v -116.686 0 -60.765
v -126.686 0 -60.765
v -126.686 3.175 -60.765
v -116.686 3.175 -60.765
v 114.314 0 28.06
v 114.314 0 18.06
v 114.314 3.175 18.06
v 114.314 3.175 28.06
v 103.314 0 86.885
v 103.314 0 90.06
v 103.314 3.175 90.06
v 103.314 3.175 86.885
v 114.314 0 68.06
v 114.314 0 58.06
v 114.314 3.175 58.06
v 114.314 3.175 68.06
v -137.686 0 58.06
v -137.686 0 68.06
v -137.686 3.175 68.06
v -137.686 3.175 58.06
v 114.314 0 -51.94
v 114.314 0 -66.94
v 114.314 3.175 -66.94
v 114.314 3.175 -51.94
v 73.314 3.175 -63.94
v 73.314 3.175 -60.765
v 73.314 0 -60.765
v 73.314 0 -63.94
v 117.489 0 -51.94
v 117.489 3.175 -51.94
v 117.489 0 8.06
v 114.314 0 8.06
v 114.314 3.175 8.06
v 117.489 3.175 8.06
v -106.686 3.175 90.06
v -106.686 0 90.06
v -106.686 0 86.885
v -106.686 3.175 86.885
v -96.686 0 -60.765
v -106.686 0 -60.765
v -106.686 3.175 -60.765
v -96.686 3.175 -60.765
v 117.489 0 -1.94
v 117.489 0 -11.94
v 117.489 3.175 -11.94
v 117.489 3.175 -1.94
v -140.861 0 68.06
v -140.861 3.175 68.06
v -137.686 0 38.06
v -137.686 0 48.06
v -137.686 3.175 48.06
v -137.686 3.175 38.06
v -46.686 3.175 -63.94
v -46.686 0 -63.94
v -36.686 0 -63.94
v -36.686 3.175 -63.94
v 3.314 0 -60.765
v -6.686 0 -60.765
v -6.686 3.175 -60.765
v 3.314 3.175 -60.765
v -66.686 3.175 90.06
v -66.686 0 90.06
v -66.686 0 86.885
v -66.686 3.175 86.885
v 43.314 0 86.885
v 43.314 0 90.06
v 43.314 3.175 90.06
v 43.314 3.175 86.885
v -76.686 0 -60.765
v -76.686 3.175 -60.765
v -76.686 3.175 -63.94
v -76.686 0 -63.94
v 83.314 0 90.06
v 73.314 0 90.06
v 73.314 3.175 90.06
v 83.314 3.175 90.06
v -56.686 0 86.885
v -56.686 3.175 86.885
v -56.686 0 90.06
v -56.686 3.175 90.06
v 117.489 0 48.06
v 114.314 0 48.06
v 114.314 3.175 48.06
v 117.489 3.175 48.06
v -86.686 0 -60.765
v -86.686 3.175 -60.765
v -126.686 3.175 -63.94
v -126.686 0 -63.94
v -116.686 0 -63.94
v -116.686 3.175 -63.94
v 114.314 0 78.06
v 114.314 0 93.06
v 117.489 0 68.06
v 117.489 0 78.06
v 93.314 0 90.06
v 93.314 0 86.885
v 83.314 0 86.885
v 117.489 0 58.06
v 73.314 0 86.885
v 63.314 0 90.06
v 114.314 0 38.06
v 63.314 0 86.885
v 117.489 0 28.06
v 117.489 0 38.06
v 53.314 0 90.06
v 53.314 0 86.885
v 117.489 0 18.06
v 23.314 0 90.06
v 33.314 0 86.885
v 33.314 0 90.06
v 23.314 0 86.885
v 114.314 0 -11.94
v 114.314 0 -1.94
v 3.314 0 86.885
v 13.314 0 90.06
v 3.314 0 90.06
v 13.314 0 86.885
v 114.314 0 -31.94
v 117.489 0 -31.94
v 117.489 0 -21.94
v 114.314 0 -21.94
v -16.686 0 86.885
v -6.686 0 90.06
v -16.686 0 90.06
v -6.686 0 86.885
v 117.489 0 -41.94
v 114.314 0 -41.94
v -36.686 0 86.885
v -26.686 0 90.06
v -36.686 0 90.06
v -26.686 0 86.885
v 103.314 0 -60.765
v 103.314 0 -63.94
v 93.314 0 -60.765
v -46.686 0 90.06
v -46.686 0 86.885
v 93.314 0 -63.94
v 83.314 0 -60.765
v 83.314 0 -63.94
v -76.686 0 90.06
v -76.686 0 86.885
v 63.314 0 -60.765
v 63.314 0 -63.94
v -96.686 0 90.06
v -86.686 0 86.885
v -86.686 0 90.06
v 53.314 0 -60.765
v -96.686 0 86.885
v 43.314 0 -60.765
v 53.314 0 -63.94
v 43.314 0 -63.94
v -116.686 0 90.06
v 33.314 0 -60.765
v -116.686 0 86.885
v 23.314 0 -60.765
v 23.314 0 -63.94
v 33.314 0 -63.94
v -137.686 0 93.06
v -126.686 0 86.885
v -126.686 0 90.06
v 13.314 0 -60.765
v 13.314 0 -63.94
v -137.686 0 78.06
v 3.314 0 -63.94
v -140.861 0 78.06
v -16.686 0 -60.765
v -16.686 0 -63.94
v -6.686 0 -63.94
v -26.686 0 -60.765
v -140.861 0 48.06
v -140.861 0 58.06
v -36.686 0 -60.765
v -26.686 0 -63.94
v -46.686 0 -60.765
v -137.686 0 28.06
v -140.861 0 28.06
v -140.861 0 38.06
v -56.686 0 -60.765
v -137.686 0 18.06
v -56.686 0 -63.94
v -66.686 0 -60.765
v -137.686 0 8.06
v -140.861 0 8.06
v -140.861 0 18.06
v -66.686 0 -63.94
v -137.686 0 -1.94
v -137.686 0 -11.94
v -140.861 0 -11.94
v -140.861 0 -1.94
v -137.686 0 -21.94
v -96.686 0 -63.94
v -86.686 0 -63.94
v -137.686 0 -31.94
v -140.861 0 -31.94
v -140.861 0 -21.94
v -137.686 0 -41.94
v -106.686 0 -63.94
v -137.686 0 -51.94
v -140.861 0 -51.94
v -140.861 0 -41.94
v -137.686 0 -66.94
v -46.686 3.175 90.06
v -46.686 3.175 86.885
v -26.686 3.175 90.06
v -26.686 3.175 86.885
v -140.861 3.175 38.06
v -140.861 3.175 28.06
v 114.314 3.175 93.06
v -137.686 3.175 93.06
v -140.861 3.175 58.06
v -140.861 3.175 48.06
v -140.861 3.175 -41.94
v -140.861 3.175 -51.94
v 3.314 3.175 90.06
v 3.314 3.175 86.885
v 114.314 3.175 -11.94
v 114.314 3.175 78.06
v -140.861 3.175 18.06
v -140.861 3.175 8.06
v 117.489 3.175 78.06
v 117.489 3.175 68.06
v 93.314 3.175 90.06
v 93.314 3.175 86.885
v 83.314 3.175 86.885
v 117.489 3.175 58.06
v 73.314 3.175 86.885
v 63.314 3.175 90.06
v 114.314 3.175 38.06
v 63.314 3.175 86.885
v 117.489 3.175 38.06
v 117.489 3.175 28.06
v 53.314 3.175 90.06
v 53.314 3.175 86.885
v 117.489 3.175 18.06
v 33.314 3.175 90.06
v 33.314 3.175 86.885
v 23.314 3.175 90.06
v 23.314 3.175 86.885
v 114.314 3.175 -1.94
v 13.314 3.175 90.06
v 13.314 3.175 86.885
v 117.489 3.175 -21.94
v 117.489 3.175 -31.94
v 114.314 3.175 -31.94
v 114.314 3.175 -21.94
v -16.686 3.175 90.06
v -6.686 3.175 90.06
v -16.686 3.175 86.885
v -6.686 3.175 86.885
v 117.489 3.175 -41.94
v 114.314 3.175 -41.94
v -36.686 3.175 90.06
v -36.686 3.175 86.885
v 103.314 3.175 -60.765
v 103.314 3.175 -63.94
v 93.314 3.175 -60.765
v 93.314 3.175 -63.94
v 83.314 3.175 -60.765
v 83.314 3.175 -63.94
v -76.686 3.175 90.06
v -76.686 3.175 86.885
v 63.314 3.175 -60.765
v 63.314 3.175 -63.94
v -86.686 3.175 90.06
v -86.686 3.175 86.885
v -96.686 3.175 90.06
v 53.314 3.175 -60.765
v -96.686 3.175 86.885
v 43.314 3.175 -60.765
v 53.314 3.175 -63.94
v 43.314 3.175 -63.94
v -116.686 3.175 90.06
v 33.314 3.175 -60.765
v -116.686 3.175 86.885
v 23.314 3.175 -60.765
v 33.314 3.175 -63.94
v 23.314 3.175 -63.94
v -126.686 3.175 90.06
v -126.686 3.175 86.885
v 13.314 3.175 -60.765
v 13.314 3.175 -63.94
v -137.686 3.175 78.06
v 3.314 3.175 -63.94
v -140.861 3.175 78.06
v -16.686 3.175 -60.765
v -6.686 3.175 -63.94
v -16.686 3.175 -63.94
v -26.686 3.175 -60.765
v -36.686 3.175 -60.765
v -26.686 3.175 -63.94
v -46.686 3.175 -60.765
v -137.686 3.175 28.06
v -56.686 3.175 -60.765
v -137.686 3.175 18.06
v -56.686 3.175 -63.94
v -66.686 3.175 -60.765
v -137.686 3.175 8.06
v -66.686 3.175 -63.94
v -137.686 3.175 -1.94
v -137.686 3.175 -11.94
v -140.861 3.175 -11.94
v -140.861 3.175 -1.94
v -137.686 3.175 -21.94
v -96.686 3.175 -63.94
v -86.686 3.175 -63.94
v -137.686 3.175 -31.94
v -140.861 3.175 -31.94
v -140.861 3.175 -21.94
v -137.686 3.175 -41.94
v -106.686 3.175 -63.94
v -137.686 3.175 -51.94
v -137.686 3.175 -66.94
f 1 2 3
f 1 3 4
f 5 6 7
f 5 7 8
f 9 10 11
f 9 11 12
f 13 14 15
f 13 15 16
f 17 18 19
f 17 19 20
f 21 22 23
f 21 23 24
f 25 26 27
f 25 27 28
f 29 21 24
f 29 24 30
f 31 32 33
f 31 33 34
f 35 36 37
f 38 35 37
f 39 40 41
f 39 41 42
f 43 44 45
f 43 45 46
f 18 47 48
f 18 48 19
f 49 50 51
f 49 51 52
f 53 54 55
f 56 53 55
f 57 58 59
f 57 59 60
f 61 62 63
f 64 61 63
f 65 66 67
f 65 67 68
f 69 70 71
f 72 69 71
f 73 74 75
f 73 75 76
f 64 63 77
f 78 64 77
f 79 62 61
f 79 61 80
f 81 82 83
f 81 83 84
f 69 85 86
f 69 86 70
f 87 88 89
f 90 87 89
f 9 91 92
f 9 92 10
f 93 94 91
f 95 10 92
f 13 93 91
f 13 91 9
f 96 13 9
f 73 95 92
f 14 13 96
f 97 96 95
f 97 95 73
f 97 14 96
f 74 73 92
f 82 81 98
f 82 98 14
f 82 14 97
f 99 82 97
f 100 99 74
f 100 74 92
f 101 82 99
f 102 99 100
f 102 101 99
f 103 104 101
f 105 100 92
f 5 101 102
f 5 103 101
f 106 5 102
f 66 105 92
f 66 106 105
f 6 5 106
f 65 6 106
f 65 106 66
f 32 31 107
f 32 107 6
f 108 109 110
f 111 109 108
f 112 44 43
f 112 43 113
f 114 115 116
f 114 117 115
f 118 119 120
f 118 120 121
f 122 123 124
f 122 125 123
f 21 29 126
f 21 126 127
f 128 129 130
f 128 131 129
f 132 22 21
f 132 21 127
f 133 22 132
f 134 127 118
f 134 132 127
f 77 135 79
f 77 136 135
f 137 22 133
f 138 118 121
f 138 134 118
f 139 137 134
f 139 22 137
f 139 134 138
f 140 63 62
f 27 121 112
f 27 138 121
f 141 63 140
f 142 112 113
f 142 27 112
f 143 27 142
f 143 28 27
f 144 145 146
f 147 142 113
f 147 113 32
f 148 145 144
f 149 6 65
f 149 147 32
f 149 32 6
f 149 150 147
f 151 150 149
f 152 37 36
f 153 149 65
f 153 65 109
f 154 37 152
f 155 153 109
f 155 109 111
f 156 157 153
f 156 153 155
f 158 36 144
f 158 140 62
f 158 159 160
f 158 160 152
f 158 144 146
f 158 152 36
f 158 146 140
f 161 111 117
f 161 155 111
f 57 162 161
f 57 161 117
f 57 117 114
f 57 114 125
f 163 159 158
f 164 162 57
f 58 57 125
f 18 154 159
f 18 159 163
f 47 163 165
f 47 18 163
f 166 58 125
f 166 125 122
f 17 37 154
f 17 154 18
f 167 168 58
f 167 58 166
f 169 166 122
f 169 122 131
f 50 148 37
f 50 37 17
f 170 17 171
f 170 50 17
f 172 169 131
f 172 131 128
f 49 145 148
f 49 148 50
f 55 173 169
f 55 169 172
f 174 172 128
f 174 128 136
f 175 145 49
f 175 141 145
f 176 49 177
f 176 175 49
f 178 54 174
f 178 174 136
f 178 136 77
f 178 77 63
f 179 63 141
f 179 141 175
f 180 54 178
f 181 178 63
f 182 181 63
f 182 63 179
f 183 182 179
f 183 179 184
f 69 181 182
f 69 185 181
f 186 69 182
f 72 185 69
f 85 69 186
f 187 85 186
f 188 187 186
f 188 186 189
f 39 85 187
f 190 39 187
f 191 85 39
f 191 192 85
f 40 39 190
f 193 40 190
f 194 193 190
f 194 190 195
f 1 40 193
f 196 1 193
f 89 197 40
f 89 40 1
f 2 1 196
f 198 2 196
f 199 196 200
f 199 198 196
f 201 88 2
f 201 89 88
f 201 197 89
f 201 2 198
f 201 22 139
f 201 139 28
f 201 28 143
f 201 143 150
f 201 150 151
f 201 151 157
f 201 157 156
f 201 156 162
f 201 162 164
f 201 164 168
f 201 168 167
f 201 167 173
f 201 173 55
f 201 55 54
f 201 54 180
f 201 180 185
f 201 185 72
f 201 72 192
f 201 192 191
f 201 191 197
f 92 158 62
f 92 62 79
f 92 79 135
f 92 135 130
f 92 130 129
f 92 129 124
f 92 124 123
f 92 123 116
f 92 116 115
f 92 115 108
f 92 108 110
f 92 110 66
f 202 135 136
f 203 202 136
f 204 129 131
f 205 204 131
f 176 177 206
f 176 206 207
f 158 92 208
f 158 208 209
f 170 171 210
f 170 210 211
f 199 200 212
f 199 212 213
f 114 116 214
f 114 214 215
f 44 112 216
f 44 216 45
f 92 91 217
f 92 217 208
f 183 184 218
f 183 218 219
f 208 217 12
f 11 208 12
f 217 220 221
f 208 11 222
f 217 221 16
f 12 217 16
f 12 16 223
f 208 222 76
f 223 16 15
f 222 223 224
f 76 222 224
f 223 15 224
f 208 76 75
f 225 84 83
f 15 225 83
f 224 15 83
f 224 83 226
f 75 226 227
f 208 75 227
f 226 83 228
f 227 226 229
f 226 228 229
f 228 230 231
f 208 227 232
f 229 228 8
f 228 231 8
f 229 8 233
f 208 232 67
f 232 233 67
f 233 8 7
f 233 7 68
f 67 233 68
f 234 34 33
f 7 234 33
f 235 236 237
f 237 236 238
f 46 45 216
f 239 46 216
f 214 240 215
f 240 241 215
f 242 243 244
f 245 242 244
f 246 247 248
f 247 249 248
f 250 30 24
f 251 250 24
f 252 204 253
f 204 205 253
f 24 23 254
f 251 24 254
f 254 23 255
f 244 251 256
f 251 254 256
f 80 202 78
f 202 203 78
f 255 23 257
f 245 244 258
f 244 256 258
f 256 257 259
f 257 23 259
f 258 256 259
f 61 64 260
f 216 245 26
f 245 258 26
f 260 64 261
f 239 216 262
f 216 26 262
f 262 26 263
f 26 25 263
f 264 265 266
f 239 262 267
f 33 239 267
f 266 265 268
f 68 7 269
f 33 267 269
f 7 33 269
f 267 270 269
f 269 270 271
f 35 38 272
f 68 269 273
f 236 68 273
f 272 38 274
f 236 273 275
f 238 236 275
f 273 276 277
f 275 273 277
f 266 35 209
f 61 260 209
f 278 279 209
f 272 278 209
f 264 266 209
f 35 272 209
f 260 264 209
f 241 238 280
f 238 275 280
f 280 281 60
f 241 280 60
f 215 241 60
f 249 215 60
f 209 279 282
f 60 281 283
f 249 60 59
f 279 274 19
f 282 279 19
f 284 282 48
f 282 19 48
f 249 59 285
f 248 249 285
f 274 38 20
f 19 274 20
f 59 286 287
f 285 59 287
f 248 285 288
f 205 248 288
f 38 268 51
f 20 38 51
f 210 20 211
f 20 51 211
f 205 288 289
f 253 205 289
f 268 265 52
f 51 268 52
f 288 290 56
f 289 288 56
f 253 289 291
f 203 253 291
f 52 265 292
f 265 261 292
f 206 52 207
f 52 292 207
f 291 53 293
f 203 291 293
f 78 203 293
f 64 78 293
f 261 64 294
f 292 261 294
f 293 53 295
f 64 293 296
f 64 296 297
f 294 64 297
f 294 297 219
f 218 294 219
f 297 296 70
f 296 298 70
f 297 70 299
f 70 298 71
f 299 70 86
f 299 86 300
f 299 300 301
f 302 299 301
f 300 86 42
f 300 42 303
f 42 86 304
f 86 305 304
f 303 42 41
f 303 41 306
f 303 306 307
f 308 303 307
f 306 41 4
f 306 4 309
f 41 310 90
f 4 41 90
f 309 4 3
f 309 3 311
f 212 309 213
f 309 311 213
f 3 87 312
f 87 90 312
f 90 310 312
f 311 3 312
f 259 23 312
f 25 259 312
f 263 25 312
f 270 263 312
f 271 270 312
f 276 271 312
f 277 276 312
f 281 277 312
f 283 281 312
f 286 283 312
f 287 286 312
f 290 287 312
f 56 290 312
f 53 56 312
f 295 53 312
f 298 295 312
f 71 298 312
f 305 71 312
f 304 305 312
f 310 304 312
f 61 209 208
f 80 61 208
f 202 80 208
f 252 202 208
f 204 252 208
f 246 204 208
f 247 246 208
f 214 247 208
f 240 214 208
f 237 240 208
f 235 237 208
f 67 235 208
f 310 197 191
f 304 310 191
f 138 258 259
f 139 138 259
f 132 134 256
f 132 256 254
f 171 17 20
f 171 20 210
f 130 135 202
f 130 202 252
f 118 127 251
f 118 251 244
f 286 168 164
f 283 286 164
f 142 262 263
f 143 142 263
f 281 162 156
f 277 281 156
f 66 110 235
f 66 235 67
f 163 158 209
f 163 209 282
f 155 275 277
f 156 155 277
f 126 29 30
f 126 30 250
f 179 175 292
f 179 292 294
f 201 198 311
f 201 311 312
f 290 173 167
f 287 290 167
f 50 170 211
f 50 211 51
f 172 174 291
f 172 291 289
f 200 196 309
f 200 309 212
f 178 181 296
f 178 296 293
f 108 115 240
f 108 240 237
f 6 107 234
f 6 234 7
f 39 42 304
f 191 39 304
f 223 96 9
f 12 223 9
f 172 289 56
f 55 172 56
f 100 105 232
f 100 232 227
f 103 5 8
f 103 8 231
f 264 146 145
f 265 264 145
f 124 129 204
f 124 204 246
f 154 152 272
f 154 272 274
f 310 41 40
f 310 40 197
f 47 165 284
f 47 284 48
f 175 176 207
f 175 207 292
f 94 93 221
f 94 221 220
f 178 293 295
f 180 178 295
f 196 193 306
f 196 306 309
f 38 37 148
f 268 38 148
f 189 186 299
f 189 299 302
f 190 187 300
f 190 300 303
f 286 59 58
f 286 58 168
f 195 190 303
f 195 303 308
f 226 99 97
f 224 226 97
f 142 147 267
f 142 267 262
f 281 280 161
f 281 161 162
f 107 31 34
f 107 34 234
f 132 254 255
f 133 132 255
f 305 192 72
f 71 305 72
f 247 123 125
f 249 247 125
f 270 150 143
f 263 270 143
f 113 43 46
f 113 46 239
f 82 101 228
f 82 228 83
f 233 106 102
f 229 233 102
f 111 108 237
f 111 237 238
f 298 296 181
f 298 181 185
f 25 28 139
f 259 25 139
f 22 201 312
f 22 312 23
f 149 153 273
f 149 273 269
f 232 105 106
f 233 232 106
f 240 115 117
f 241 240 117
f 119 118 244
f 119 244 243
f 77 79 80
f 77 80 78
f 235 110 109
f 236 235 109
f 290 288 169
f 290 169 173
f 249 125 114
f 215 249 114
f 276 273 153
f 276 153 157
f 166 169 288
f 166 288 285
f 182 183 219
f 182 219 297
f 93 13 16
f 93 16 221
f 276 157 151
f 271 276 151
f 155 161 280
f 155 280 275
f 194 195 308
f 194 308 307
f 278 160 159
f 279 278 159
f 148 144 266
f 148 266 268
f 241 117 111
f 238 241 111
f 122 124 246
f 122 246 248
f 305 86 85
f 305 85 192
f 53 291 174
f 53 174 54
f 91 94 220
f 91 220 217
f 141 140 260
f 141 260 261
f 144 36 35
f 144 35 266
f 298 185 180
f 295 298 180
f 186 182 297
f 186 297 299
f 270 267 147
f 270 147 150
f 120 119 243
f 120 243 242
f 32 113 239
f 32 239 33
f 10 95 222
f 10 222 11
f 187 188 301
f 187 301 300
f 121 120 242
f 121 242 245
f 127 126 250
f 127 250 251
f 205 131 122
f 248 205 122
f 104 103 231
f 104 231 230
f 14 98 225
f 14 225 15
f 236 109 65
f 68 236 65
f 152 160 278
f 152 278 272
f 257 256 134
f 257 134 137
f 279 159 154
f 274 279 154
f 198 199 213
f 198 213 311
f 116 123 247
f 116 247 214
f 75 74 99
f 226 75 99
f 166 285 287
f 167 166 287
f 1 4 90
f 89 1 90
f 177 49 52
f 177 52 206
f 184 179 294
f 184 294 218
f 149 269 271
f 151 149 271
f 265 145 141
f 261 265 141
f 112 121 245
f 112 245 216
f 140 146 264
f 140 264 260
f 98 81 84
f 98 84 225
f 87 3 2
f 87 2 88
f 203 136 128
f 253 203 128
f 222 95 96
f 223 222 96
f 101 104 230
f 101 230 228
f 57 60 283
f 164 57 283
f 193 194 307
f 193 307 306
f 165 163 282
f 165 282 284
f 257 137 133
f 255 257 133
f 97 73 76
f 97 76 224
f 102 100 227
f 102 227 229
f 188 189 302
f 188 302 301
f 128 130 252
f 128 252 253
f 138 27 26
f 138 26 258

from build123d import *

# Parameters (mm, degrees)
SKETCH2_W           = 10
SKETCH2_H           = 3.175
BOSS_EXTRUDE1_DEPTH = 3.175


with BuildPart() as part:
    # Sketch2 → Boss-Extrude1 (new body)
    with BuildSketch(Plane(origin=(0, 0, 0), x_dir=(1, 0, 0), z_dir=(0, 1, 0))):
        Polygon((-137.685687371, 51.939525879), (-137.685687371, 66.939525879), (114.314312629, 66.939525879), (114.314312629, 51.939525879), (117.489312629, 51.939525879), (117.489312629, 41.939525879), (114.314312629, 41.939525879), (114.314312629, 31.939525879), (117.489312629, 31.939525879), (117.489312629, 21.939525879), (114.314312629, 21.939525879), (114.314312629, 11.939525879), (117.489312629, 11.939525879), (117.489312629, 1.939525879), (114.314312629, 1.939525879), (114.314312629, -8.060474121), (117.489312629, -8.060474121), (117.489312629, -18.060474121), (114.314312629, -18.060474121), (114.314312629, -28.060474121), (117.489312629, -28.060474121), (117.489312629, -38.060474121), (114.314312629, -38.060474121), (114.314312629, -48.060474121), (117.489312629, -48.060474121), (117.489312629, -58.060474121), (114.314312629, -58.060474121), (114.314312629, -68.060474121), (117.489312629, -68.060474121), (117.489312629, -78.060474121), (114.314312629, -78.060474121), (114.314312629, -93.060474121), (-137.685687371, -93.060474121), (-137.685687371, -78.060474121), (-140.860687371, -78.060474121), (-140.860687371, -68.060474121), (-137.685687371, -68.060474121), (-137.685687371, -58.060474121), (-140.860687371, -58.060474121), (-140.860687371, -48.060474121), (-137.685687371, -48.060474121), (-137.685687371, -38.060474121), (-140.860687371, -38.060474121), (-140.860687371, -28.060474121), (-137.685687371, -28.060474121), (-137.685687371, -18.060474121), (-140.860687371, -18.060474121), (-140.860687371, -8.060474121), (-137.685687371, -8.060474121), (-137.685687371, 1.939525879), (-140.860687371, 1.939525879), (-140.860687371, 11.939525879), (-137.685687371, 11.939525879), (-137.685687371, 21.939525879), (-140.860687371, 21.939525879), (-140.860687371, 31.939525879), (-137.685687371, 31.939525879), (-137.685687371, 41.939525879), (-140.860687371, 41.939525879), (-140.860687371, 51.939525879), align=None)
        with Locations((-101.685687371, 62.352025879)):
            Rectangle(SKETCH2_W, SKETCH2_H, mode=Mode.SUBTRACT)
        with Locations((-121.685687371, 62.352025879)):
            Rectangle(SKETCH2_W, SKETCH2_H, mode=Mode.SUBTRACT)
        with Locations((-81.685687371, 62.352025879)):
            Rectangle(SKETCH2_W, SKETCH2_H, mode=Mode.SUBTRACT)
        with Locations((-61.685687371, 62.352025879)):
            Rectangle(SKETCH2_W, SKETCH2_H, mode=Mode.SUBTRACT)
        with Locations((-41.685687371, 62.352025879)):
            Rectangle(SKETCH2_W, SKETCH2_H, mode=Mode.SUBTRACT)
        with Locations((-21.685687371, 62.352025879)):
            Rectangle(SKETCH2_W, SKETCH2_H, mode=Mode.SUBTRACT)
        with Locations((-1.685687371, 62.352025879)):
            Rectangle(SKETCH2_W, SKETCH2_H, mode=Mode.SUBTRACT)
        with Locations((18.314312629, 62.352025879)):
            Rectangle(SKETCH2_W, SKETCH2_H, mode=Mode.SUBTRACT)
        with Locations((38.314312629, 62.352025879)):
            Rectangle(SKETCH2_W, SKETCH2_H, mode=Mode.SUBTRACT)
        with Locations((58.314312629, 62.352025879)):
            Rectangle(SKETCH2_W, SKETCH2_H, mode=Mode.SUBTRACT)
        with Locations((78.314312629, 62.352025879)):
            Rectangle(SKETCH2_W, SKETCH2_H, mode=Mode.SUBTRACT)
        with Locations((98.314312629, 62.352025879)):
            Rectangle(SKETCH2_W, SKETCH2_H, mode=Mode.SUBTRACT)
        with Locations((98.314312629, -88.472974121)):
            Rectangle(SKETCH2_W, SKETCH2_H, mode=Mode.SUBTRACT)
        with Locations((78.314312629, -88.472974121)):
            Rectangle(SKETCH2_W, SKETCH2_H, mode=Mode.SUBTRACT)
        with Locations((58.314312629, -88.472974121)):
            Rectangle(SKETCH2_W, SKETCH2_H, mode=Mode.SUBTRACT)
        with Locations((38.314312629, -88.472974121)):
            Rectangle(SKETCH2_W, SKETCH2_H, mode=Mode.SUBTRACT)
        with Locations((18.314312629, -88.472974121)):
            Rectangle(SKETCH2_W, SKETCH2_H, mode=Mode.SUBTRACT)
        with Locations((-1.685687371, -88.472974121)):
            Rectangle(SKETCH2_W, SKETCH2_H, mode=Mode.SUBTRACT)
        with Locations((-21.685687371, -88.472974121)):
            Rectangle(SKETCH2_W, SKETCH2_H, mode=Mode.SUBTRACT)
        with Locations((-41.685687371, -88.472974121)):
            Rectangle(SKETCH2_W, SKETCH2_H, mode=Mode.SUBTRACT)
        with Locations((-61.685687371, -88.472974121)):
            Rectangle(SKETCH2_W, SKETCH2_H, mode=Mode.SUBTRACT)
        with Locations((-81.685687371, -88.472974121)):
            Rectangle(SKETCH2_W, SKETCH2_H, mode=Mode.SUBTRACT)
        with Locations((-101.685687371, -88.472974121)):
            Rectangle(SKETCH2_W, SKETCH2_H, mode=Mode.SUBTRACT)
        with Locations((-121.685687371, -88.472974121)):
            Rectangle(SKETCH2_W, SKETCH2_H, mode=Mode.SUBTRACT)
    extrude(amount=BOSS_EXTRUDE1_DEPTH)


solid = part.part
